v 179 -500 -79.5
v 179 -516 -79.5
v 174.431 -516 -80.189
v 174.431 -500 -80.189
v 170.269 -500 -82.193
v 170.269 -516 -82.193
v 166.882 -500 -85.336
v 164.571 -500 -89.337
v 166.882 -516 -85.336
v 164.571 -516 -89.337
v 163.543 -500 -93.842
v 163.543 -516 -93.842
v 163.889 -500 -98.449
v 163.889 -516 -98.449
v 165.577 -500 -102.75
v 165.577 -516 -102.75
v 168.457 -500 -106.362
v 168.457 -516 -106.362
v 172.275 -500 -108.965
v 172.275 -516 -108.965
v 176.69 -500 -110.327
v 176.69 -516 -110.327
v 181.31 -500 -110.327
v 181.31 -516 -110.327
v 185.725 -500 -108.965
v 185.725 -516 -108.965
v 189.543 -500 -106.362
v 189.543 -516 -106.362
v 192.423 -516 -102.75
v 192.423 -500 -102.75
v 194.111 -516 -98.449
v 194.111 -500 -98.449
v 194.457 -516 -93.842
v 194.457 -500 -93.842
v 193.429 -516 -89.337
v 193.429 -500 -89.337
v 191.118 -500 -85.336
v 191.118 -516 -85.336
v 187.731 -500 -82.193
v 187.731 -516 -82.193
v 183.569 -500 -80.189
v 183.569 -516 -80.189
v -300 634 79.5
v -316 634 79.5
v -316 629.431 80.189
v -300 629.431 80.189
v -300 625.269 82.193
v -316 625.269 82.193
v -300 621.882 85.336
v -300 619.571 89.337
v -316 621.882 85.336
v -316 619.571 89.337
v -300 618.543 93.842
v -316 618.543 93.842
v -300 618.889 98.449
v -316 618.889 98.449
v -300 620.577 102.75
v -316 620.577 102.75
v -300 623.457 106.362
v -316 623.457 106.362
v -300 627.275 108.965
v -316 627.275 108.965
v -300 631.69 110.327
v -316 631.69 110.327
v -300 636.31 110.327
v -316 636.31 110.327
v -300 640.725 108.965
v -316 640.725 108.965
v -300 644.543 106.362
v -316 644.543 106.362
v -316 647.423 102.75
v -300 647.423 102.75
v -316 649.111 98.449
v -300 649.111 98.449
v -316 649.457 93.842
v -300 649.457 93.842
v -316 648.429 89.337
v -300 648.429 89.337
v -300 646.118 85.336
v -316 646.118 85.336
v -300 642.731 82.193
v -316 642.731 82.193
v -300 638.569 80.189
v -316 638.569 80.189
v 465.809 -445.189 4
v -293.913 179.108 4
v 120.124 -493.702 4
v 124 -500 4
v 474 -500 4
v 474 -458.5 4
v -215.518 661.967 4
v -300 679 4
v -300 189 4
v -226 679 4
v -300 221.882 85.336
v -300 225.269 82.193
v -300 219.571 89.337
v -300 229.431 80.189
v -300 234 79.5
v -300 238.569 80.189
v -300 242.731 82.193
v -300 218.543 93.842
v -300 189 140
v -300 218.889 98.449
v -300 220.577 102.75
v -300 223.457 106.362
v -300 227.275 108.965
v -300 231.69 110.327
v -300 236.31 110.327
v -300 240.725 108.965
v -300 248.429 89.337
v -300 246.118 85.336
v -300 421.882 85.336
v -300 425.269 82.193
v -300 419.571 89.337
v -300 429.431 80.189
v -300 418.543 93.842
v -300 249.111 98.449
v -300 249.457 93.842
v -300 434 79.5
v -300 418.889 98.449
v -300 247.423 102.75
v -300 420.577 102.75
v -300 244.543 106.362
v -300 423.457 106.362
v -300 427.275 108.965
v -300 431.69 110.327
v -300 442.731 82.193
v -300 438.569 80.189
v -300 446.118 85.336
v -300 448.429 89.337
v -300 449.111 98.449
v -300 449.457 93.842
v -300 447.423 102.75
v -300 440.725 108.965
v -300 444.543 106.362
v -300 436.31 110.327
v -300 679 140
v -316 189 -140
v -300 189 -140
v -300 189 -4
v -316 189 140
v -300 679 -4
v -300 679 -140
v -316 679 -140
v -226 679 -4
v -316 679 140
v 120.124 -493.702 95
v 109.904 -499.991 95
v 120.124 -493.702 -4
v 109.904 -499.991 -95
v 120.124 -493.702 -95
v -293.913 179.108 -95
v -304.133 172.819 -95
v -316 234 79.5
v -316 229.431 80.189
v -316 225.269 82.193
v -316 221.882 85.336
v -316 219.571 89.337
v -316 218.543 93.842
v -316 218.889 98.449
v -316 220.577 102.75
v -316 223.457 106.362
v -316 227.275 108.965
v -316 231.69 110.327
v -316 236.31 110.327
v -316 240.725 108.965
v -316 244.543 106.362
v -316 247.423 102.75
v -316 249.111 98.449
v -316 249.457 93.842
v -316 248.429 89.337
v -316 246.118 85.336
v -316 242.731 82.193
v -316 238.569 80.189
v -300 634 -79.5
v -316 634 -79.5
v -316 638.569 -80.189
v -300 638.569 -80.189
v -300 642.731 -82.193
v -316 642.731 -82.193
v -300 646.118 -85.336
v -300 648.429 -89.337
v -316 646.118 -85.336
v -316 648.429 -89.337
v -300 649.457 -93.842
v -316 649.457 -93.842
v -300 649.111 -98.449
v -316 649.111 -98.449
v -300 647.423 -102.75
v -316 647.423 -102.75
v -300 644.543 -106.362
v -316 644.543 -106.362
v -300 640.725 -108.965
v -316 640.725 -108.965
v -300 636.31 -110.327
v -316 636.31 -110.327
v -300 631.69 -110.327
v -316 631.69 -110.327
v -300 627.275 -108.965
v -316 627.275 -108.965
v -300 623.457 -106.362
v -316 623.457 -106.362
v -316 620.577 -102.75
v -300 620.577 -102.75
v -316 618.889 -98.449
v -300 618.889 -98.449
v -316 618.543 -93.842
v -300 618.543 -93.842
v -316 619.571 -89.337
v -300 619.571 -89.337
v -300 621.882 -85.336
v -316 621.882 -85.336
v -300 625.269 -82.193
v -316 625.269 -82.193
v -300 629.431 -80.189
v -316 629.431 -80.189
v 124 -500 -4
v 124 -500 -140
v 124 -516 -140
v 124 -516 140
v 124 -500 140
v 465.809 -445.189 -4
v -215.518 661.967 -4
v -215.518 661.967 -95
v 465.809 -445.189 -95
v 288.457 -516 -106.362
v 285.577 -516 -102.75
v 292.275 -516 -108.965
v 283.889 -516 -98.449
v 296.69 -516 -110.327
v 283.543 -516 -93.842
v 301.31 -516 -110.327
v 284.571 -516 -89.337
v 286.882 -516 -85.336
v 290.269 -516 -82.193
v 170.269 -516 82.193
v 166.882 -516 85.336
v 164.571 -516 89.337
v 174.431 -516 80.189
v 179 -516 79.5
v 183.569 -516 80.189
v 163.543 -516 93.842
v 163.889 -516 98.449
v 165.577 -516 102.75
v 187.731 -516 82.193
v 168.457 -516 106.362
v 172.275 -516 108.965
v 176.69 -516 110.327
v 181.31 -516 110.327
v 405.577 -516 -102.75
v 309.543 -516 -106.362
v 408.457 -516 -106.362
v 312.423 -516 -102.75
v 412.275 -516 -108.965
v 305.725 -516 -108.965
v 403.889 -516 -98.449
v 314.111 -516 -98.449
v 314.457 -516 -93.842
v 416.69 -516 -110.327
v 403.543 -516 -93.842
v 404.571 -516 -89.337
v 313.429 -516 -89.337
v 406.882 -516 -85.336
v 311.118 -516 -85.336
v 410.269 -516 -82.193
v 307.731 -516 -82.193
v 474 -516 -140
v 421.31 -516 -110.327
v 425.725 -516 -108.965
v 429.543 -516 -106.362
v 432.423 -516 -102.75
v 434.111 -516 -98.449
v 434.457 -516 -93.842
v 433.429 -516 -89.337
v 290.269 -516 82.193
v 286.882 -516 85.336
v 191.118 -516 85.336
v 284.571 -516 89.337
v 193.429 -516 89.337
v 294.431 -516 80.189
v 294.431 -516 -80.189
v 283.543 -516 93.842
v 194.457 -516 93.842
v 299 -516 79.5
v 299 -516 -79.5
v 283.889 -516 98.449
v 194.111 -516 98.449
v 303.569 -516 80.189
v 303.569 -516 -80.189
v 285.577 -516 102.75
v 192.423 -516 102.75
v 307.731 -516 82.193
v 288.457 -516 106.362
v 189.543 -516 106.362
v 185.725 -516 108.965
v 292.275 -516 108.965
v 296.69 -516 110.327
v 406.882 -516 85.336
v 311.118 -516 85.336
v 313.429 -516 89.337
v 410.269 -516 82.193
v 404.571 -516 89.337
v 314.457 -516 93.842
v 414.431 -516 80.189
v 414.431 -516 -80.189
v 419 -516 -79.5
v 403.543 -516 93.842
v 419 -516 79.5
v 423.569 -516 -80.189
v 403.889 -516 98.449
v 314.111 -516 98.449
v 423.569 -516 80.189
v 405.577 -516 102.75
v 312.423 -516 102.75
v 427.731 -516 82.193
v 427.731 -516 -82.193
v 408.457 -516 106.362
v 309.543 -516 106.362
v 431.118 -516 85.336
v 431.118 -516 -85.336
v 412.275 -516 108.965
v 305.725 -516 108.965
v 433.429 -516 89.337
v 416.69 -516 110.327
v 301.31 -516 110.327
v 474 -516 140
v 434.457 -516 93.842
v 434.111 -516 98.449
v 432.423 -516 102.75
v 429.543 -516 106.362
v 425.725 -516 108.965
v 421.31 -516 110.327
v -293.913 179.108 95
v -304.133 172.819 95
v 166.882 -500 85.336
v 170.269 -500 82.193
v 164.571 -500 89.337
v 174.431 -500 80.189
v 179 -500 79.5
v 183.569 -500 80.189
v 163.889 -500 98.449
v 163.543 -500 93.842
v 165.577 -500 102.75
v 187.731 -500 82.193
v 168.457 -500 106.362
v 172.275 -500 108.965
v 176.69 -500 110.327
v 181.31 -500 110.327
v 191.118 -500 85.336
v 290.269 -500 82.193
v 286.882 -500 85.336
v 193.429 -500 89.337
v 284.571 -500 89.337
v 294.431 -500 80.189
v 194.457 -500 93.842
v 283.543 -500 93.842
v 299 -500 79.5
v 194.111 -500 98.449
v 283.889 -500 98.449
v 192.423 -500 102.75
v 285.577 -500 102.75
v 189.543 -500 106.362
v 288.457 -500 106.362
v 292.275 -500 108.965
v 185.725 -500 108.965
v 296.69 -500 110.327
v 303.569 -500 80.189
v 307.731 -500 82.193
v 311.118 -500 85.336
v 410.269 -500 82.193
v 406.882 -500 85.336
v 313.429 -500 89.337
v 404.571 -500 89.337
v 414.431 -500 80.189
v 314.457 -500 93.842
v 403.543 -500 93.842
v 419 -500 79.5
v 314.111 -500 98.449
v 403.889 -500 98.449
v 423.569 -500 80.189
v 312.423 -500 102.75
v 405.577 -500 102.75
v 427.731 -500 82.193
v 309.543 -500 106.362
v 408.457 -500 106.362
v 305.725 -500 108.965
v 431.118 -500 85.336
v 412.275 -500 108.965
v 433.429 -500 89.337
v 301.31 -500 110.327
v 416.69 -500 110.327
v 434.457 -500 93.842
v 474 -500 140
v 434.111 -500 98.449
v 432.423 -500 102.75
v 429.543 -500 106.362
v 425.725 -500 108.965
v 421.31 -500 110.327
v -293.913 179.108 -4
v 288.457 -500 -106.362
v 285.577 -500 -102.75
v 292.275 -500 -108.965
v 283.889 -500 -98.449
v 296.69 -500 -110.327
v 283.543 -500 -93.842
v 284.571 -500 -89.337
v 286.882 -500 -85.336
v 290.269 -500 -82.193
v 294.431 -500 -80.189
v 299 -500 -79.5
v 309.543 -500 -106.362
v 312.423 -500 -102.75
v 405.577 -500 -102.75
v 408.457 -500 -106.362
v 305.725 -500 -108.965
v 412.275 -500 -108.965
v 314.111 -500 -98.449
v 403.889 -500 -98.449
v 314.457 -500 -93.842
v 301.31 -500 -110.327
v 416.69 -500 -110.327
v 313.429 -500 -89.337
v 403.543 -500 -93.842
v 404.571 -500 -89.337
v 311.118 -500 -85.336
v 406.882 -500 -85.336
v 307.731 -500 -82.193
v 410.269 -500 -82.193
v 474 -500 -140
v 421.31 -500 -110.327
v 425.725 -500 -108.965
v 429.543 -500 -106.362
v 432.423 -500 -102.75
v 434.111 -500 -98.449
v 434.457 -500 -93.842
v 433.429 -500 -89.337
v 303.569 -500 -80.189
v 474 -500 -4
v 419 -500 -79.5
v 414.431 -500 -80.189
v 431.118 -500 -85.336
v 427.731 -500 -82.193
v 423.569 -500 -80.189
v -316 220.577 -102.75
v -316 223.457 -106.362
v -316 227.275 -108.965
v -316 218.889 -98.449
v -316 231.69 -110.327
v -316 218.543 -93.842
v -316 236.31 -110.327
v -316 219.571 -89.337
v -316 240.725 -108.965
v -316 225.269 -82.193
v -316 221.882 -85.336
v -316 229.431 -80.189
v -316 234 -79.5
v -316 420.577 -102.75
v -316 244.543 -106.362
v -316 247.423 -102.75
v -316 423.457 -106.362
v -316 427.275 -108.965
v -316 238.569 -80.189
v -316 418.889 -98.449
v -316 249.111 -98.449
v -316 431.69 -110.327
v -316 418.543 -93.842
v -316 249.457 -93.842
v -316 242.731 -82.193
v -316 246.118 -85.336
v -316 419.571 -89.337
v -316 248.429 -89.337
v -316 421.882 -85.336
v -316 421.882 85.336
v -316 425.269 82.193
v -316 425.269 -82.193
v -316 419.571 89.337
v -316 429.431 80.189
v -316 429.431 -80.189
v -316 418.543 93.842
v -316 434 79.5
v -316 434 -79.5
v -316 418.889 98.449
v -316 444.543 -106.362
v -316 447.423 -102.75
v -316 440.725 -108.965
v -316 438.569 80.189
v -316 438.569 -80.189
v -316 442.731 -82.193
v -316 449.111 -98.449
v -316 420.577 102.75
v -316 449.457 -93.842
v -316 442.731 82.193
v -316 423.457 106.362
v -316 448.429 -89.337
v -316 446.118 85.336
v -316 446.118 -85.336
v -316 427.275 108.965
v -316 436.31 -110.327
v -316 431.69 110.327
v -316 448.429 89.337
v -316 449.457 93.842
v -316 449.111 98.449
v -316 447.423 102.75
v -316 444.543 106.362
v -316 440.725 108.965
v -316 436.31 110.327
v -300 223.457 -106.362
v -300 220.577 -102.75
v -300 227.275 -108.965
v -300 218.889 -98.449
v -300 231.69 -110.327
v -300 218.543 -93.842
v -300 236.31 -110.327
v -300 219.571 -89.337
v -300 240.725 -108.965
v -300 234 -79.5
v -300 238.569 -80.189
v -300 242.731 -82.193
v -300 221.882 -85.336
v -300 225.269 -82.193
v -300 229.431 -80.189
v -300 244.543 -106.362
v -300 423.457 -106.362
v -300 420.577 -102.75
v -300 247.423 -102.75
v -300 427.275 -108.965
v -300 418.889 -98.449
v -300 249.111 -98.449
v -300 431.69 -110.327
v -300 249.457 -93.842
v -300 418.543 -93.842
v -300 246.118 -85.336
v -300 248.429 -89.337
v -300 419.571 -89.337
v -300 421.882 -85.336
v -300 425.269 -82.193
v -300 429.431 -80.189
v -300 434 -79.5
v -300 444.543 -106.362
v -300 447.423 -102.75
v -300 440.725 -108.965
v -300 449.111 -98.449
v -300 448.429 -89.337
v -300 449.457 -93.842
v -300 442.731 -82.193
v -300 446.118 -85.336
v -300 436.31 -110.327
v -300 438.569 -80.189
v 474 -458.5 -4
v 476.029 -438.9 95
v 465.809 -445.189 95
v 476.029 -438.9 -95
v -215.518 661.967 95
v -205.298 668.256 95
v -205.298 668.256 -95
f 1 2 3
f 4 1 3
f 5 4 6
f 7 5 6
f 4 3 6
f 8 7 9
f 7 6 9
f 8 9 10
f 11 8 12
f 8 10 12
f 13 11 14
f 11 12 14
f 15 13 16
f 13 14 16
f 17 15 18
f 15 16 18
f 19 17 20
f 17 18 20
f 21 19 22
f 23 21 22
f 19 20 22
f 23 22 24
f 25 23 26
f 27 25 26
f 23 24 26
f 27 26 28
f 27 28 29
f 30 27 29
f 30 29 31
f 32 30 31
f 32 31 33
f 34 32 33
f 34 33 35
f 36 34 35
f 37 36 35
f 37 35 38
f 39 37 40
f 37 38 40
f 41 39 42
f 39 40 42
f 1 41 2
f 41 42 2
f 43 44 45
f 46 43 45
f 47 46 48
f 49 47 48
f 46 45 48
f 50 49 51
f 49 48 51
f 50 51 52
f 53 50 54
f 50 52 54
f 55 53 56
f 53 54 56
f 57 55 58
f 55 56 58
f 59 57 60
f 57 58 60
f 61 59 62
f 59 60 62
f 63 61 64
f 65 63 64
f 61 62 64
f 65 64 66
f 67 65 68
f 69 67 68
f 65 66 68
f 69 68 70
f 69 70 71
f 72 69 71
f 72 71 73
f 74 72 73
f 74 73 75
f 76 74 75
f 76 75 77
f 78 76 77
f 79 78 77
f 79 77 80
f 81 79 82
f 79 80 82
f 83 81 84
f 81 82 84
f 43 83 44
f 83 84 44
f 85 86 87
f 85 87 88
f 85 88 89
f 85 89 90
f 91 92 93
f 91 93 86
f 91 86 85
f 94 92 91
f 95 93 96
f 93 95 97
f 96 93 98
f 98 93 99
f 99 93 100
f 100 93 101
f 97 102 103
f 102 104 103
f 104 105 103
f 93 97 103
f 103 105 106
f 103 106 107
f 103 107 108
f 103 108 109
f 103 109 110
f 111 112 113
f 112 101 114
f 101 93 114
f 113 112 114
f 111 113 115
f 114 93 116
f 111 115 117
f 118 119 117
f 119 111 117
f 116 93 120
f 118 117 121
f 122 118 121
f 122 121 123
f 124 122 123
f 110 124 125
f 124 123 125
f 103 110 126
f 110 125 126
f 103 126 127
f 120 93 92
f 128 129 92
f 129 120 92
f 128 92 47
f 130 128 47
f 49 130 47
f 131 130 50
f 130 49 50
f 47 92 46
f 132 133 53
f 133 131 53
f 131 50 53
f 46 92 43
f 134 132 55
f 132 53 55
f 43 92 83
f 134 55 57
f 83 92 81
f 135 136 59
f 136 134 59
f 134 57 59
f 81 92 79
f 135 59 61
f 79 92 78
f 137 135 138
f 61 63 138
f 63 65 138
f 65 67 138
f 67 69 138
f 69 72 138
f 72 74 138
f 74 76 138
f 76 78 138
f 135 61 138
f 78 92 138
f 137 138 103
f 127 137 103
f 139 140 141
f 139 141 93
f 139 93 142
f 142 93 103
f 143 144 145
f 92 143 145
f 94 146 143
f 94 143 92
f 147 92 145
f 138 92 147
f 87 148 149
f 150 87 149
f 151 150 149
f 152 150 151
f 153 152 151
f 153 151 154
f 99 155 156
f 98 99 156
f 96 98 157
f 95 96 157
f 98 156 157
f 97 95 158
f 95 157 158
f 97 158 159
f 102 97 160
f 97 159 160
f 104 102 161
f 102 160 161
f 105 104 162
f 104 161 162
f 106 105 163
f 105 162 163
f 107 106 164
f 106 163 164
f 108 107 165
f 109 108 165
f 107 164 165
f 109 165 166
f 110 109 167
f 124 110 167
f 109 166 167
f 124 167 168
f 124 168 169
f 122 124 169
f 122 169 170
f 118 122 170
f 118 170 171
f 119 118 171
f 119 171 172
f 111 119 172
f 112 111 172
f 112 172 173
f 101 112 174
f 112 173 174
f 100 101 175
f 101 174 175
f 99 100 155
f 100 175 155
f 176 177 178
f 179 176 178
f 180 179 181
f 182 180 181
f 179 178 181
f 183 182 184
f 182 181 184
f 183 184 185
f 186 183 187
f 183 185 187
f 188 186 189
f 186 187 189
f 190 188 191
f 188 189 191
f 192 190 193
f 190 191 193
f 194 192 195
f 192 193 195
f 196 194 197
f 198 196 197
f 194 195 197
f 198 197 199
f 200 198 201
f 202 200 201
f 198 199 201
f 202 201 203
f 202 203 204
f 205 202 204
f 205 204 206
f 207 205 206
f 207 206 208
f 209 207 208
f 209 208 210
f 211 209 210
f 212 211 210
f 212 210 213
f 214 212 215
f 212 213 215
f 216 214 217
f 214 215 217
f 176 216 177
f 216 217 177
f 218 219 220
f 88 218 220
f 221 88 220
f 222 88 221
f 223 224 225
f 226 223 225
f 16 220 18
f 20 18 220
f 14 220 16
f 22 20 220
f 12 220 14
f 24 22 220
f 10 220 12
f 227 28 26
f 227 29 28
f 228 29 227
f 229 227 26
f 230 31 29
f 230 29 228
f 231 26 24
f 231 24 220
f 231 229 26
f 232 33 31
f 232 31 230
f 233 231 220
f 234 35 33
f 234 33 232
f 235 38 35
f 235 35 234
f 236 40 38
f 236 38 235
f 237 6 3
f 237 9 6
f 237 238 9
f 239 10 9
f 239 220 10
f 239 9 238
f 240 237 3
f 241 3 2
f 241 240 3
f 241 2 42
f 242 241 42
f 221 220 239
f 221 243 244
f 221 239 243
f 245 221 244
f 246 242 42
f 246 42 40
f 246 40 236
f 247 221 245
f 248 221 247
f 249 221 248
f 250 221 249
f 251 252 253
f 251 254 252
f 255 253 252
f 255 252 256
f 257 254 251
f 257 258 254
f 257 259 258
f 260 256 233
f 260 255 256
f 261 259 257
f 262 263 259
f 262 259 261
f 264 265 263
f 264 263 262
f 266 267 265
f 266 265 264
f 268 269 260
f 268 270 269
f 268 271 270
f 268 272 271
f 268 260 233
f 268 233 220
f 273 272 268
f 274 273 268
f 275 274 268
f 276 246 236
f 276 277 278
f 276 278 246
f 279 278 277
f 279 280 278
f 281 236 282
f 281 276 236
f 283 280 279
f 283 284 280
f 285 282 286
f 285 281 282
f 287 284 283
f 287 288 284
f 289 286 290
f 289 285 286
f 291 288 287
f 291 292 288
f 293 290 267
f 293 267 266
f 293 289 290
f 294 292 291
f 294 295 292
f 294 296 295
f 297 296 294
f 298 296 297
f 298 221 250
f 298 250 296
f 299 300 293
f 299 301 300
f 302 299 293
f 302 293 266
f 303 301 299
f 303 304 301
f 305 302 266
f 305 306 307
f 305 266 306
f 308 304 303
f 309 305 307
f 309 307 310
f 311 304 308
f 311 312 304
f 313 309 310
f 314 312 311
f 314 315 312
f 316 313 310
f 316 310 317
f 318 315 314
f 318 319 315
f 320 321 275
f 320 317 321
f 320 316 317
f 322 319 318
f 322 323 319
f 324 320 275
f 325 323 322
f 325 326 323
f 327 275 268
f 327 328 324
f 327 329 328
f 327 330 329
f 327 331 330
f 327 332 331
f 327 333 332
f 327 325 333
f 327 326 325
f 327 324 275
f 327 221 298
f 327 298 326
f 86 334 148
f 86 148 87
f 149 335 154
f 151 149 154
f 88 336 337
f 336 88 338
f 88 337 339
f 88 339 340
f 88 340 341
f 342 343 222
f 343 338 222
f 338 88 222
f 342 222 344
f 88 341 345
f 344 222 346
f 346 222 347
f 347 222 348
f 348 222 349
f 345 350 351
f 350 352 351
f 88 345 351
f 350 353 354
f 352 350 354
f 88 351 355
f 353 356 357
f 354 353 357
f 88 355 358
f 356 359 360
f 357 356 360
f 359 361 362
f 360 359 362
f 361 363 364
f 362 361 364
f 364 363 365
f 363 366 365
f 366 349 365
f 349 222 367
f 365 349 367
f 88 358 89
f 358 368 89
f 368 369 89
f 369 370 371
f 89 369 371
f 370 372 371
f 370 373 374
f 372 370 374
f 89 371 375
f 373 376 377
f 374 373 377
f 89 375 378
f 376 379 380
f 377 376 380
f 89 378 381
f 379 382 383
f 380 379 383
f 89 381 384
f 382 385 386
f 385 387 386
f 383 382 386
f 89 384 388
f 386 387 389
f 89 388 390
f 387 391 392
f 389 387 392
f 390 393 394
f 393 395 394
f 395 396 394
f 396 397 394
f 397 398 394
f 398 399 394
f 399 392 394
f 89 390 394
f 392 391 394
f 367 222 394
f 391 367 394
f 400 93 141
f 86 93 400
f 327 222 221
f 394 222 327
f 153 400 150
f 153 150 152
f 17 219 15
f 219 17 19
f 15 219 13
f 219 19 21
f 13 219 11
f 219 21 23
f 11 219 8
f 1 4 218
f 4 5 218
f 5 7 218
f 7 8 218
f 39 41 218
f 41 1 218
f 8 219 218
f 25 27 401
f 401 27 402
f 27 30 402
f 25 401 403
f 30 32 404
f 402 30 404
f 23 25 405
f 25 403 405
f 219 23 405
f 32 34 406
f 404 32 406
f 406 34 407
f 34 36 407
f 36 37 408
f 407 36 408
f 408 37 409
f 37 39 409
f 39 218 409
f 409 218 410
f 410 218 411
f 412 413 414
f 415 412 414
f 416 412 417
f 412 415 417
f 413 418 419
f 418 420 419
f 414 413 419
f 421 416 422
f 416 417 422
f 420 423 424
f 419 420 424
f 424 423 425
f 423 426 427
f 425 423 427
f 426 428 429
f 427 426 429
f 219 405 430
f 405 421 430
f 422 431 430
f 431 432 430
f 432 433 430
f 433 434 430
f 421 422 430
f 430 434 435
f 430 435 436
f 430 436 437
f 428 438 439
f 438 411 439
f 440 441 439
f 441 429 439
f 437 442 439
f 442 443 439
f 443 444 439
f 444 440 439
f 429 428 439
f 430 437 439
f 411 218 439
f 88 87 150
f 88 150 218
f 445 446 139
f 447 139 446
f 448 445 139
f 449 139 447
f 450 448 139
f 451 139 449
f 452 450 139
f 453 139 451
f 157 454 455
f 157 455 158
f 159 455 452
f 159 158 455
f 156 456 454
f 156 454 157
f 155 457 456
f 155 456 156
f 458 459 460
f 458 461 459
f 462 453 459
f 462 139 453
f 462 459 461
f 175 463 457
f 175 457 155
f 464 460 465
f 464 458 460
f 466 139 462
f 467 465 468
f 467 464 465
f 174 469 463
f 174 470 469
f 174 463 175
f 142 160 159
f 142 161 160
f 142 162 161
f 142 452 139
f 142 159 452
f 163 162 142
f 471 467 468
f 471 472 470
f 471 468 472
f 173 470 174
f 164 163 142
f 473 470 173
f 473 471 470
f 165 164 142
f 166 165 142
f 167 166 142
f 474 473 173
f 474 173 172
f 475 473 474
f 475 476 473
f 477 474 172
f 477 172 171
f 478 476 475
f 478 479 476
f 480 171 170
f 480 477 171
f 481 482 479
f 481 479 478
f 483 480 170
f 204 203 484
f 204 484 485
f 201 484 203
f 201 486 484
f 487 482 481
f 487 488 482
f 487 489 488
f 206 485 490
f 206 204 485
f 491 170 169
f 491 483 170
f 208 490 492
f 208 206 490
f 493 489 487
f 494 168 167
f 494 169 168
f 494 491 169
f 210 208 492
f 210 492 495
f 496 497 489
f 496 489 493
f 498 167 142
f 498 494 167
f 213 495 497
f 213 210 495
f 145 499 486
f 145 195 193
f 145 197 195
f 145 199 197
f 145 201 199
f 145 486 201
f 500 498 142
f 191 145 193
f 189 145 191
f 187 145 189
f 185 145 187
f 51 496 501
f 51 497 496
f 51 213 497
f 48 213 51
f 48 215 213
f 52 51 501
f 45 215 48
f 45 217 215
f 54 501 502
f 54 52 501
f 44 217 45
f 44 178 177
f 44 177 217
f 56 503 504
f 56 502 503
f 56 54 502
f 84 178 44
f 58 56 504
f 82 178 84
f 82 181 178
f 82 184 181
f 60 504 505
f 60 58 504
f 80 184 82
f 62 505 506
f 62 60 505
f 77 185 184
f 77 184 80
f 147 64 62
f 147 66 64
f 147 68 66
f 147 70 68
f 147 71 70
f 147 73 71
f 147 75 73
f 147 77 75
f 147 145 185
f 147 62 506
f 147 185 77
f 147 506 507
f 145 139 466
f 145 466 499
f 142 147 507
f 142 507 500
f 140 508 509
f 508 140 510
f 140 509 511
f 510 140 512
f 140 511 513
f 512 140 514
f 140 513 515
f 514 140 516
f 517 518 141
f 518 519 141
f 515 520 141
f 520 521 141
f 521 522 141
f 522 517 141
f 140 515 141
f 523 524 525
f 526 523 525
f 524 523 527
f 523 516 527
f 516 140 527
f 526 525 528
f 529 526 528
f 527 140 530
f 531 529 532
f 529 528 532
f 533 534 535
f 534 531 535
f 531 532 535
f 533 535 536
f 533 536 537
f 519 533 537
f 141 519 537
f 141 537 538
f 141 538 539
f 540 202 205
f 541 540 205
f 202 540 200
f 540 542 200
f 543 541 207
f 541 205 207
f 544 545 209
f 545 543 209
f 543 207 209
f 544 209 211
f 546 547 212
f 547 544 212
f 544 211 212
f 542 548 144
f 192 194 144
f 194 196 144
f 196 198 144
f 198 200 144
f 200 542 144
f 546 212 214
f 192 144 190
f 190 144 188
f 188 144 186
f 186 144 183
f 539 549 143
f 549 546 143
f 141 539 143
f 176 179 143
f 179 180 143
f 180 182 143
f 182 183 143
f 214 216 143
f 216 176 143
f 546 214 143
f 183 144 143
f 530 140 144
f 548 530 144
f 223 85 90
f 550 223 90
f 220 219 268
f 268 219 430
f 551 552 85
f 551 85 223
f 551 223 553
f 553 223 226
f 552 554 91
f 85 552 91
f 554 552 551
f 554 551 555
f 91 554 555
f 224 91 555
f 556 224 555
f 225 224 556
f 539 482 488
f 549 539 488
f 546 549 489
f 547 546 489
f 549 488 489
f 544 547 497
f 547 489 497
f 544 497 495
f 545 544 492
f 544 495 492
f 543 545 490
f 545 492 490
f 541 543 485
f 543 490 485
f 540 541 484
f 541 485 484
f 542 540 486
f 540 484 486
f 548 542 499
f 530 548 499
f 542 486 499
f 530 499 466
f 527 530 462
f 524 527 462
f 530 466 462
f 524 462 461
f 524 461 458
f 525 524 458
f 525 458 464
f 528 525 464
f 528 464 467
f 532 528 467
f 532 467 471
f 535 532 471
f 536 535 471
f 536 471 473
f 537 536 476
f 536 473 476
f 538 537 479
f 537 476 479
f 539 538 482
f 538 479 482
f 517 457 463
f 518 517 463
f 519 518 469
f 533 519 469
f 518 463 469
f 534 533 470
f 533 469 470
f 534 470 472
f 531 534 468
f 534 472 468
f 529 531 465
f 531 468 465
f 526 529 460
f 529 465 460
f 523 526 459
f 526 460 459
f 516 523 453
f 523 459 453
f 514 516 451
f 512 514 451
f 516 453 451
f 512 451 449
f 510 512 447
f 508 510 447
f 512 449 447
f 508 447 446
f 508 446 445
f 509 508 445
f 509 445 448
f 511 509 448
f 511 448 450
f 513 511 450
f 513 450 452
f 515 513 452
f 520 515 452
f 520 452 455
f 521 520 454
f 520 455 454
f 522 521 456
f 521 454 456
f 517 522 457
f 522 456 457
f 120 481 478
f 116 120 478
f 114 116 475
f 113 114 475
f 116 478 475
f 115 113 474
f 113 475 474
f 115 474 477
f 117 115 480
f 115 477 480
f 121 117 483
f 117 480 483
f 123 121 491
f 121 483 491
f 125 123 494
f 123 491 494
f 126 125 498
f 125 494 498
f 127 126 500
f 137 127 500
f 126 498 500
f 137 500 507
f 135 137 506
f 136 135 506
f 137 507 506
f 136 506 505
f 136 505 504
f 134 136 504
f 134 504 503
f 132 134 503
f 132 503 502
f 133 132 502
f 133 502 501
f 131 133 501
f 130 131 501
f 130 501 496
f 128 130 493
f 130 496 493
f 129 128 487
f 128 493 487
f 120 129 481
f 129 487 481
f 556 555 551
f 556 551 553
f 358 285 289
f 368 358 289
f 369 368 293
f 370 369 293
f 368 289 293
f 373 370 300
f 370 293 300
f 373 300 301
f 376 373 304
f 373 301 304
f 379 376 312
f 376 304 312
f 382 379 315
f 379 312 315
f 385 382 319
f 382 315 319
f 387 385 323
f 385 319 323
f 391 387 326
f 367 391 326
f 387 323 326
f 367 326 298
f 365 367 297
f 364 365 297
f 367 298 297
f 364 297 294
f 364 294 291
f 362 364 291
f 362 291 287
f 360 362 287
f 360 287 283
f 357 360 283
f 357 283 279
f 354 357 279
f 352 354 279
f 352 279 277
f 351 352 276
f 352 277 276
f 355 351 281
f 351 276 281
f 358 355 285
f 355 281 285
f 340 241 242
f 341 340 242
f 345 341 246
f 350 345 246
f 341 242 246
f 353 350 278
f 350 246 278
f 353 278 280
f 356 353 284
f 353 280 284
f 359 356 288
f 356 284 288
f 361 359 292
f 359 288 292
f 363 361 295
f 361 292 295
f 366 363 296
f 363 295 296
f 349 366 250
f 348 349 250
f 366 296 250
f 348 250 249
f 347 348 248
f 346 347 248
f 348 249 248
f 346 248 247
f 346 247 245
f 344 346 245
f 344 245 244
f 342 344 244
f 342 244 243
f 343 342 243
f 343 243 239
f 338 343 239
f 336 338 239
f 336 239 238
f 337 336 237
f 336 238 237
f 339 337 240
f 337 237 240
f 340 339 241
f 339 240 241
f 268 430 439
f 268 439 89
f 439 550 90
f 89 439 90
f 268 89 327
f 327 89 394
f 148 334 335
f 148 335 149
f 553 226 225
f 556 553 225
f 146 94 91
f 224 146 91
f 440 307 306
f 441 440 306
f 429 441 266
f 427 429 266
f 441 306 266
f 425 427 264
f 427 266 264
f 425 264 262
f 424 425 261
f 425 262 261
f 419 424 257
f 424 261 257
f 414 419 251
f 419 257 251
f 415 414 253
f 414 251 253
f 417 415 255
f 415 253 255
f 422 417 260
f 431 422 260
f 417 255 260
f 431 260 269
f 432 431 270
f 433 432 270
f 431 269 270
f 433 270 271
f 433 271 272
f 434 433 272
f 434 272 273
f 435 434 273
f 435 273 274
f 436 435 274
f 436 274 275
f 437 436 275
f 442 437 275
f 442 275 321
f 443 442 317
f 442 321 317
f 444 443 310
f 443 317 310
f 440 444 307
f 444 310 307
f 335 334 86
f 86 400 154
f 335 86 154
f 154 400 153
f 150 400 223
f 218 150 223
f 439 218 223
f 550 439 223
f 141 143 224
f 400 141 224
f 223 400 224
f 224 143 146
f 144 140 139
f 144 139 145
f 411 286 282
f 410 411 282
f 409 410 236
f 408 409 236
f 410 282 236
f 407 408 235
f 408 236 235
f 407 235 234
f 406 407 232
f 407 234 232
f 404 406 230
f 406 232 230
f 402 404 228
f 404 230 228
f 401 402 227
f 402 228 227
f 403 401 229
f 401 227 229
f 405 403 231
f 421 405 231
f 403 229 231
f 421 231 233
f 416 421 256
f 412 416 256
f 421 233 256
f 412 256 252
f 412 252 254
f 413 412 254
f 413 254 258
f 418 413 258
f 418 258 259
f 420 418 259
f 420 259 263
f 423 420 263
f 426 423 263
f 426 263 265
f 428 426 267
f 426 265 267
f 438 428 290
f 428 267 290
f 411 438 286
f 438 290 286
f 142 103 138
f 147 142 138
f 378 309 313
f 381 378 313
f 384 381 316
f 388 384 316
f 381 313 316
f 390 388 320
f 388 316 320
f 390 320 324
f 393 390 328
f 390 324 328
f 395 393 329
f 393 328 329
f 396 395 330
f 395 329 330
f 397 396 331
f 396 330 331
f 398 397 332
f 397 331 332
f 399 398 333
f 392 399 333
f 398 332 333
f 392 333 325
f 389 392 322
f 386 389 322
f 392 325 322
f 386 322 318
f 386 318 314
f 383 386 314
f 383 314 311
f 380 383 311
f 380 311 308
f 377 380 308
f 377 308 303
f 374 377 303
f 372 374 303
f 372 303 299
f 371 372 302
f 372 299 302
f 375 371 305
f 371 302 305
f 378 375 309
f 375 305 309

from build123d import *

# Parameters (mm, degrees)
SKETCH_1_W          = 774
SKETCH_1_H          = 1179
EXTRUDE_1_DEPTH     = 4
CUT_EXTRUDE_2_DEPTH = 8
SKETCH_3_W          = 280
SKETCH_3_H          = 490
EXTRUDE_3_DEPTH     = 16
SKETCH_4_R          = 15.5
CUT_EXTRUDE_4_DEPTH = 16
EXTRUDE_5_DEPTH     = 12
SKETCH_7_W          = 350
SKETCH_7_H          = 280
EXTRUDE_6_DEPTH     = 16
SKETCH_8_R          = 15.5
CUT_EXTRUDE_7_DEPTH = 16
SKETCH_9_W          = 190
SKETCH_9_H          = 1300
EXTRUDE_8_DEPTH     = 12


with BuildPart() as part:
    # 草图1 → 拉伸1 (new, symmetric)
    with BuildSketch(Plane.XY):
        with Locations((87, 89.5)):
            Rectangle(SKETCH_1_W, SKETCH_1_H)
    extrude(amount=EXTRUDE_1_DEPTH, both=True)

    # 草图2 → 拉伸2 (cut)
    with BuildSketch(Plane.XY.offset(4)):
        Polygon((-300, -500), (-300, 189), (124, -500), align=None)
        Polygon((-226, 679), (474, -458.5), (474, 679), align=None)
    extrude(amount=-CUT_EXTRUDE_2_DEPTH, mode=Mode.SUBTRACT)

    # 草图3 → 拉伸3 (add)
    with BuildSketch(Plane.ZY.offset(300)):
        with Locations((0, 434)):
            Rectangle(SKETCH_3_W, SKETCH_3_H)
    extrude(amount=EXTRUDE_3_DEPTH)

    # 草图4 → 拉伸4 (cut)
    with BuildSketch(Plane.ZY.offset(316)):
        with Locations((-95, 634)):
            Circle(SKETCH_4_R)
        with Locations((-95, 434)):
            Circle(SKETCH_4_R)
        with Locations((-95, 234)):
            Circle(SKETCH_4_R)
        with Locations(Location((95, 234, 0), (0, 0, 180))):
            Circle(SKETCH_4_R)
        with Locations(Location((95, 434, 0), (0, 0, 180))):
            Circle(SKETCH_4_R)
        with Locations(Location((95, 634, 0), (0, 0, 180))):
            Circle(SKETCH_4_R)
    extrude(amount=-CUT_EXTRUDE_4_DEPTH, mode=Mode.SUBTRACT)

    # 草图5 → 拉伸5 (add)
    with BuildSketch(Plane(origin=(-133.236051502, -81.991416309, 0), x_dir=(0, 0, 1), z_dir=(-0.8516583167045437, -0.5240974256643349, 0))):
        Polygon((0, 306.578208367), (95, 306.578208367), (95, -483.421791633), (-95, -483.421791633), (-95, 306.578208367), align=None)
    extrude(amount=EXTRUDE_5_DEPTH)

    # 草图7 → 拉伸6 (add)
    with BuildSketch(Plane.XZ.offset(500)):
        with Locations((299, 0)):
            Rectangle(SKETCH_7_W, SKETCH_7_H)
    extrude(amount=EXTRUDE_6_DEPTH)

    # 草图8 → 拉伸7 (cut)
    with BuildSketch(Plane.XZ.offset(516)):
        with Locations(Location((179, 95, 0), (0, 0, 270))):
            Circle(SKETCH_8_R)
        with Locations(Location((299, 95, 0), (0, 0, 270))):
            Circle(SKETCH_8_R)
        with Locations(Location((419, 95, 0), (0, 0, 270))):
            Circle(SKETCH_8_R)
        with Locations(Location((419, -95, 0), (0, 0, 90))):
            Circle(SKETCH_8_R)
        with Locations(Location((299, -95, 0), (0, 0, 90))):
            Circle(SKETCH_8_R)
        with Locations(Location((179, -95, 0), (0, 0, 90))):
            Circle(SKETCH_8_R)
    extrude(amount=-CUT_EXTRUDE_7_DEPTH, mode=Mode.SUBTRACT)

    # 草图9 → 拉伸8 (add)
    with BuildSketch(Plane(origin=(139.150214592, 85.630901288, 0), x_dir=(0, 0, -1), z_dir=(0.8516583167045437, 0.5240974256643349, 0))):
        with Locations((0, 26.722015243)):
            Rectangle(SKETCH_9_W, SKETCH_9_H)
    extrude(amount=EXTRUDE_8_DEPTH)


solid = part.part
